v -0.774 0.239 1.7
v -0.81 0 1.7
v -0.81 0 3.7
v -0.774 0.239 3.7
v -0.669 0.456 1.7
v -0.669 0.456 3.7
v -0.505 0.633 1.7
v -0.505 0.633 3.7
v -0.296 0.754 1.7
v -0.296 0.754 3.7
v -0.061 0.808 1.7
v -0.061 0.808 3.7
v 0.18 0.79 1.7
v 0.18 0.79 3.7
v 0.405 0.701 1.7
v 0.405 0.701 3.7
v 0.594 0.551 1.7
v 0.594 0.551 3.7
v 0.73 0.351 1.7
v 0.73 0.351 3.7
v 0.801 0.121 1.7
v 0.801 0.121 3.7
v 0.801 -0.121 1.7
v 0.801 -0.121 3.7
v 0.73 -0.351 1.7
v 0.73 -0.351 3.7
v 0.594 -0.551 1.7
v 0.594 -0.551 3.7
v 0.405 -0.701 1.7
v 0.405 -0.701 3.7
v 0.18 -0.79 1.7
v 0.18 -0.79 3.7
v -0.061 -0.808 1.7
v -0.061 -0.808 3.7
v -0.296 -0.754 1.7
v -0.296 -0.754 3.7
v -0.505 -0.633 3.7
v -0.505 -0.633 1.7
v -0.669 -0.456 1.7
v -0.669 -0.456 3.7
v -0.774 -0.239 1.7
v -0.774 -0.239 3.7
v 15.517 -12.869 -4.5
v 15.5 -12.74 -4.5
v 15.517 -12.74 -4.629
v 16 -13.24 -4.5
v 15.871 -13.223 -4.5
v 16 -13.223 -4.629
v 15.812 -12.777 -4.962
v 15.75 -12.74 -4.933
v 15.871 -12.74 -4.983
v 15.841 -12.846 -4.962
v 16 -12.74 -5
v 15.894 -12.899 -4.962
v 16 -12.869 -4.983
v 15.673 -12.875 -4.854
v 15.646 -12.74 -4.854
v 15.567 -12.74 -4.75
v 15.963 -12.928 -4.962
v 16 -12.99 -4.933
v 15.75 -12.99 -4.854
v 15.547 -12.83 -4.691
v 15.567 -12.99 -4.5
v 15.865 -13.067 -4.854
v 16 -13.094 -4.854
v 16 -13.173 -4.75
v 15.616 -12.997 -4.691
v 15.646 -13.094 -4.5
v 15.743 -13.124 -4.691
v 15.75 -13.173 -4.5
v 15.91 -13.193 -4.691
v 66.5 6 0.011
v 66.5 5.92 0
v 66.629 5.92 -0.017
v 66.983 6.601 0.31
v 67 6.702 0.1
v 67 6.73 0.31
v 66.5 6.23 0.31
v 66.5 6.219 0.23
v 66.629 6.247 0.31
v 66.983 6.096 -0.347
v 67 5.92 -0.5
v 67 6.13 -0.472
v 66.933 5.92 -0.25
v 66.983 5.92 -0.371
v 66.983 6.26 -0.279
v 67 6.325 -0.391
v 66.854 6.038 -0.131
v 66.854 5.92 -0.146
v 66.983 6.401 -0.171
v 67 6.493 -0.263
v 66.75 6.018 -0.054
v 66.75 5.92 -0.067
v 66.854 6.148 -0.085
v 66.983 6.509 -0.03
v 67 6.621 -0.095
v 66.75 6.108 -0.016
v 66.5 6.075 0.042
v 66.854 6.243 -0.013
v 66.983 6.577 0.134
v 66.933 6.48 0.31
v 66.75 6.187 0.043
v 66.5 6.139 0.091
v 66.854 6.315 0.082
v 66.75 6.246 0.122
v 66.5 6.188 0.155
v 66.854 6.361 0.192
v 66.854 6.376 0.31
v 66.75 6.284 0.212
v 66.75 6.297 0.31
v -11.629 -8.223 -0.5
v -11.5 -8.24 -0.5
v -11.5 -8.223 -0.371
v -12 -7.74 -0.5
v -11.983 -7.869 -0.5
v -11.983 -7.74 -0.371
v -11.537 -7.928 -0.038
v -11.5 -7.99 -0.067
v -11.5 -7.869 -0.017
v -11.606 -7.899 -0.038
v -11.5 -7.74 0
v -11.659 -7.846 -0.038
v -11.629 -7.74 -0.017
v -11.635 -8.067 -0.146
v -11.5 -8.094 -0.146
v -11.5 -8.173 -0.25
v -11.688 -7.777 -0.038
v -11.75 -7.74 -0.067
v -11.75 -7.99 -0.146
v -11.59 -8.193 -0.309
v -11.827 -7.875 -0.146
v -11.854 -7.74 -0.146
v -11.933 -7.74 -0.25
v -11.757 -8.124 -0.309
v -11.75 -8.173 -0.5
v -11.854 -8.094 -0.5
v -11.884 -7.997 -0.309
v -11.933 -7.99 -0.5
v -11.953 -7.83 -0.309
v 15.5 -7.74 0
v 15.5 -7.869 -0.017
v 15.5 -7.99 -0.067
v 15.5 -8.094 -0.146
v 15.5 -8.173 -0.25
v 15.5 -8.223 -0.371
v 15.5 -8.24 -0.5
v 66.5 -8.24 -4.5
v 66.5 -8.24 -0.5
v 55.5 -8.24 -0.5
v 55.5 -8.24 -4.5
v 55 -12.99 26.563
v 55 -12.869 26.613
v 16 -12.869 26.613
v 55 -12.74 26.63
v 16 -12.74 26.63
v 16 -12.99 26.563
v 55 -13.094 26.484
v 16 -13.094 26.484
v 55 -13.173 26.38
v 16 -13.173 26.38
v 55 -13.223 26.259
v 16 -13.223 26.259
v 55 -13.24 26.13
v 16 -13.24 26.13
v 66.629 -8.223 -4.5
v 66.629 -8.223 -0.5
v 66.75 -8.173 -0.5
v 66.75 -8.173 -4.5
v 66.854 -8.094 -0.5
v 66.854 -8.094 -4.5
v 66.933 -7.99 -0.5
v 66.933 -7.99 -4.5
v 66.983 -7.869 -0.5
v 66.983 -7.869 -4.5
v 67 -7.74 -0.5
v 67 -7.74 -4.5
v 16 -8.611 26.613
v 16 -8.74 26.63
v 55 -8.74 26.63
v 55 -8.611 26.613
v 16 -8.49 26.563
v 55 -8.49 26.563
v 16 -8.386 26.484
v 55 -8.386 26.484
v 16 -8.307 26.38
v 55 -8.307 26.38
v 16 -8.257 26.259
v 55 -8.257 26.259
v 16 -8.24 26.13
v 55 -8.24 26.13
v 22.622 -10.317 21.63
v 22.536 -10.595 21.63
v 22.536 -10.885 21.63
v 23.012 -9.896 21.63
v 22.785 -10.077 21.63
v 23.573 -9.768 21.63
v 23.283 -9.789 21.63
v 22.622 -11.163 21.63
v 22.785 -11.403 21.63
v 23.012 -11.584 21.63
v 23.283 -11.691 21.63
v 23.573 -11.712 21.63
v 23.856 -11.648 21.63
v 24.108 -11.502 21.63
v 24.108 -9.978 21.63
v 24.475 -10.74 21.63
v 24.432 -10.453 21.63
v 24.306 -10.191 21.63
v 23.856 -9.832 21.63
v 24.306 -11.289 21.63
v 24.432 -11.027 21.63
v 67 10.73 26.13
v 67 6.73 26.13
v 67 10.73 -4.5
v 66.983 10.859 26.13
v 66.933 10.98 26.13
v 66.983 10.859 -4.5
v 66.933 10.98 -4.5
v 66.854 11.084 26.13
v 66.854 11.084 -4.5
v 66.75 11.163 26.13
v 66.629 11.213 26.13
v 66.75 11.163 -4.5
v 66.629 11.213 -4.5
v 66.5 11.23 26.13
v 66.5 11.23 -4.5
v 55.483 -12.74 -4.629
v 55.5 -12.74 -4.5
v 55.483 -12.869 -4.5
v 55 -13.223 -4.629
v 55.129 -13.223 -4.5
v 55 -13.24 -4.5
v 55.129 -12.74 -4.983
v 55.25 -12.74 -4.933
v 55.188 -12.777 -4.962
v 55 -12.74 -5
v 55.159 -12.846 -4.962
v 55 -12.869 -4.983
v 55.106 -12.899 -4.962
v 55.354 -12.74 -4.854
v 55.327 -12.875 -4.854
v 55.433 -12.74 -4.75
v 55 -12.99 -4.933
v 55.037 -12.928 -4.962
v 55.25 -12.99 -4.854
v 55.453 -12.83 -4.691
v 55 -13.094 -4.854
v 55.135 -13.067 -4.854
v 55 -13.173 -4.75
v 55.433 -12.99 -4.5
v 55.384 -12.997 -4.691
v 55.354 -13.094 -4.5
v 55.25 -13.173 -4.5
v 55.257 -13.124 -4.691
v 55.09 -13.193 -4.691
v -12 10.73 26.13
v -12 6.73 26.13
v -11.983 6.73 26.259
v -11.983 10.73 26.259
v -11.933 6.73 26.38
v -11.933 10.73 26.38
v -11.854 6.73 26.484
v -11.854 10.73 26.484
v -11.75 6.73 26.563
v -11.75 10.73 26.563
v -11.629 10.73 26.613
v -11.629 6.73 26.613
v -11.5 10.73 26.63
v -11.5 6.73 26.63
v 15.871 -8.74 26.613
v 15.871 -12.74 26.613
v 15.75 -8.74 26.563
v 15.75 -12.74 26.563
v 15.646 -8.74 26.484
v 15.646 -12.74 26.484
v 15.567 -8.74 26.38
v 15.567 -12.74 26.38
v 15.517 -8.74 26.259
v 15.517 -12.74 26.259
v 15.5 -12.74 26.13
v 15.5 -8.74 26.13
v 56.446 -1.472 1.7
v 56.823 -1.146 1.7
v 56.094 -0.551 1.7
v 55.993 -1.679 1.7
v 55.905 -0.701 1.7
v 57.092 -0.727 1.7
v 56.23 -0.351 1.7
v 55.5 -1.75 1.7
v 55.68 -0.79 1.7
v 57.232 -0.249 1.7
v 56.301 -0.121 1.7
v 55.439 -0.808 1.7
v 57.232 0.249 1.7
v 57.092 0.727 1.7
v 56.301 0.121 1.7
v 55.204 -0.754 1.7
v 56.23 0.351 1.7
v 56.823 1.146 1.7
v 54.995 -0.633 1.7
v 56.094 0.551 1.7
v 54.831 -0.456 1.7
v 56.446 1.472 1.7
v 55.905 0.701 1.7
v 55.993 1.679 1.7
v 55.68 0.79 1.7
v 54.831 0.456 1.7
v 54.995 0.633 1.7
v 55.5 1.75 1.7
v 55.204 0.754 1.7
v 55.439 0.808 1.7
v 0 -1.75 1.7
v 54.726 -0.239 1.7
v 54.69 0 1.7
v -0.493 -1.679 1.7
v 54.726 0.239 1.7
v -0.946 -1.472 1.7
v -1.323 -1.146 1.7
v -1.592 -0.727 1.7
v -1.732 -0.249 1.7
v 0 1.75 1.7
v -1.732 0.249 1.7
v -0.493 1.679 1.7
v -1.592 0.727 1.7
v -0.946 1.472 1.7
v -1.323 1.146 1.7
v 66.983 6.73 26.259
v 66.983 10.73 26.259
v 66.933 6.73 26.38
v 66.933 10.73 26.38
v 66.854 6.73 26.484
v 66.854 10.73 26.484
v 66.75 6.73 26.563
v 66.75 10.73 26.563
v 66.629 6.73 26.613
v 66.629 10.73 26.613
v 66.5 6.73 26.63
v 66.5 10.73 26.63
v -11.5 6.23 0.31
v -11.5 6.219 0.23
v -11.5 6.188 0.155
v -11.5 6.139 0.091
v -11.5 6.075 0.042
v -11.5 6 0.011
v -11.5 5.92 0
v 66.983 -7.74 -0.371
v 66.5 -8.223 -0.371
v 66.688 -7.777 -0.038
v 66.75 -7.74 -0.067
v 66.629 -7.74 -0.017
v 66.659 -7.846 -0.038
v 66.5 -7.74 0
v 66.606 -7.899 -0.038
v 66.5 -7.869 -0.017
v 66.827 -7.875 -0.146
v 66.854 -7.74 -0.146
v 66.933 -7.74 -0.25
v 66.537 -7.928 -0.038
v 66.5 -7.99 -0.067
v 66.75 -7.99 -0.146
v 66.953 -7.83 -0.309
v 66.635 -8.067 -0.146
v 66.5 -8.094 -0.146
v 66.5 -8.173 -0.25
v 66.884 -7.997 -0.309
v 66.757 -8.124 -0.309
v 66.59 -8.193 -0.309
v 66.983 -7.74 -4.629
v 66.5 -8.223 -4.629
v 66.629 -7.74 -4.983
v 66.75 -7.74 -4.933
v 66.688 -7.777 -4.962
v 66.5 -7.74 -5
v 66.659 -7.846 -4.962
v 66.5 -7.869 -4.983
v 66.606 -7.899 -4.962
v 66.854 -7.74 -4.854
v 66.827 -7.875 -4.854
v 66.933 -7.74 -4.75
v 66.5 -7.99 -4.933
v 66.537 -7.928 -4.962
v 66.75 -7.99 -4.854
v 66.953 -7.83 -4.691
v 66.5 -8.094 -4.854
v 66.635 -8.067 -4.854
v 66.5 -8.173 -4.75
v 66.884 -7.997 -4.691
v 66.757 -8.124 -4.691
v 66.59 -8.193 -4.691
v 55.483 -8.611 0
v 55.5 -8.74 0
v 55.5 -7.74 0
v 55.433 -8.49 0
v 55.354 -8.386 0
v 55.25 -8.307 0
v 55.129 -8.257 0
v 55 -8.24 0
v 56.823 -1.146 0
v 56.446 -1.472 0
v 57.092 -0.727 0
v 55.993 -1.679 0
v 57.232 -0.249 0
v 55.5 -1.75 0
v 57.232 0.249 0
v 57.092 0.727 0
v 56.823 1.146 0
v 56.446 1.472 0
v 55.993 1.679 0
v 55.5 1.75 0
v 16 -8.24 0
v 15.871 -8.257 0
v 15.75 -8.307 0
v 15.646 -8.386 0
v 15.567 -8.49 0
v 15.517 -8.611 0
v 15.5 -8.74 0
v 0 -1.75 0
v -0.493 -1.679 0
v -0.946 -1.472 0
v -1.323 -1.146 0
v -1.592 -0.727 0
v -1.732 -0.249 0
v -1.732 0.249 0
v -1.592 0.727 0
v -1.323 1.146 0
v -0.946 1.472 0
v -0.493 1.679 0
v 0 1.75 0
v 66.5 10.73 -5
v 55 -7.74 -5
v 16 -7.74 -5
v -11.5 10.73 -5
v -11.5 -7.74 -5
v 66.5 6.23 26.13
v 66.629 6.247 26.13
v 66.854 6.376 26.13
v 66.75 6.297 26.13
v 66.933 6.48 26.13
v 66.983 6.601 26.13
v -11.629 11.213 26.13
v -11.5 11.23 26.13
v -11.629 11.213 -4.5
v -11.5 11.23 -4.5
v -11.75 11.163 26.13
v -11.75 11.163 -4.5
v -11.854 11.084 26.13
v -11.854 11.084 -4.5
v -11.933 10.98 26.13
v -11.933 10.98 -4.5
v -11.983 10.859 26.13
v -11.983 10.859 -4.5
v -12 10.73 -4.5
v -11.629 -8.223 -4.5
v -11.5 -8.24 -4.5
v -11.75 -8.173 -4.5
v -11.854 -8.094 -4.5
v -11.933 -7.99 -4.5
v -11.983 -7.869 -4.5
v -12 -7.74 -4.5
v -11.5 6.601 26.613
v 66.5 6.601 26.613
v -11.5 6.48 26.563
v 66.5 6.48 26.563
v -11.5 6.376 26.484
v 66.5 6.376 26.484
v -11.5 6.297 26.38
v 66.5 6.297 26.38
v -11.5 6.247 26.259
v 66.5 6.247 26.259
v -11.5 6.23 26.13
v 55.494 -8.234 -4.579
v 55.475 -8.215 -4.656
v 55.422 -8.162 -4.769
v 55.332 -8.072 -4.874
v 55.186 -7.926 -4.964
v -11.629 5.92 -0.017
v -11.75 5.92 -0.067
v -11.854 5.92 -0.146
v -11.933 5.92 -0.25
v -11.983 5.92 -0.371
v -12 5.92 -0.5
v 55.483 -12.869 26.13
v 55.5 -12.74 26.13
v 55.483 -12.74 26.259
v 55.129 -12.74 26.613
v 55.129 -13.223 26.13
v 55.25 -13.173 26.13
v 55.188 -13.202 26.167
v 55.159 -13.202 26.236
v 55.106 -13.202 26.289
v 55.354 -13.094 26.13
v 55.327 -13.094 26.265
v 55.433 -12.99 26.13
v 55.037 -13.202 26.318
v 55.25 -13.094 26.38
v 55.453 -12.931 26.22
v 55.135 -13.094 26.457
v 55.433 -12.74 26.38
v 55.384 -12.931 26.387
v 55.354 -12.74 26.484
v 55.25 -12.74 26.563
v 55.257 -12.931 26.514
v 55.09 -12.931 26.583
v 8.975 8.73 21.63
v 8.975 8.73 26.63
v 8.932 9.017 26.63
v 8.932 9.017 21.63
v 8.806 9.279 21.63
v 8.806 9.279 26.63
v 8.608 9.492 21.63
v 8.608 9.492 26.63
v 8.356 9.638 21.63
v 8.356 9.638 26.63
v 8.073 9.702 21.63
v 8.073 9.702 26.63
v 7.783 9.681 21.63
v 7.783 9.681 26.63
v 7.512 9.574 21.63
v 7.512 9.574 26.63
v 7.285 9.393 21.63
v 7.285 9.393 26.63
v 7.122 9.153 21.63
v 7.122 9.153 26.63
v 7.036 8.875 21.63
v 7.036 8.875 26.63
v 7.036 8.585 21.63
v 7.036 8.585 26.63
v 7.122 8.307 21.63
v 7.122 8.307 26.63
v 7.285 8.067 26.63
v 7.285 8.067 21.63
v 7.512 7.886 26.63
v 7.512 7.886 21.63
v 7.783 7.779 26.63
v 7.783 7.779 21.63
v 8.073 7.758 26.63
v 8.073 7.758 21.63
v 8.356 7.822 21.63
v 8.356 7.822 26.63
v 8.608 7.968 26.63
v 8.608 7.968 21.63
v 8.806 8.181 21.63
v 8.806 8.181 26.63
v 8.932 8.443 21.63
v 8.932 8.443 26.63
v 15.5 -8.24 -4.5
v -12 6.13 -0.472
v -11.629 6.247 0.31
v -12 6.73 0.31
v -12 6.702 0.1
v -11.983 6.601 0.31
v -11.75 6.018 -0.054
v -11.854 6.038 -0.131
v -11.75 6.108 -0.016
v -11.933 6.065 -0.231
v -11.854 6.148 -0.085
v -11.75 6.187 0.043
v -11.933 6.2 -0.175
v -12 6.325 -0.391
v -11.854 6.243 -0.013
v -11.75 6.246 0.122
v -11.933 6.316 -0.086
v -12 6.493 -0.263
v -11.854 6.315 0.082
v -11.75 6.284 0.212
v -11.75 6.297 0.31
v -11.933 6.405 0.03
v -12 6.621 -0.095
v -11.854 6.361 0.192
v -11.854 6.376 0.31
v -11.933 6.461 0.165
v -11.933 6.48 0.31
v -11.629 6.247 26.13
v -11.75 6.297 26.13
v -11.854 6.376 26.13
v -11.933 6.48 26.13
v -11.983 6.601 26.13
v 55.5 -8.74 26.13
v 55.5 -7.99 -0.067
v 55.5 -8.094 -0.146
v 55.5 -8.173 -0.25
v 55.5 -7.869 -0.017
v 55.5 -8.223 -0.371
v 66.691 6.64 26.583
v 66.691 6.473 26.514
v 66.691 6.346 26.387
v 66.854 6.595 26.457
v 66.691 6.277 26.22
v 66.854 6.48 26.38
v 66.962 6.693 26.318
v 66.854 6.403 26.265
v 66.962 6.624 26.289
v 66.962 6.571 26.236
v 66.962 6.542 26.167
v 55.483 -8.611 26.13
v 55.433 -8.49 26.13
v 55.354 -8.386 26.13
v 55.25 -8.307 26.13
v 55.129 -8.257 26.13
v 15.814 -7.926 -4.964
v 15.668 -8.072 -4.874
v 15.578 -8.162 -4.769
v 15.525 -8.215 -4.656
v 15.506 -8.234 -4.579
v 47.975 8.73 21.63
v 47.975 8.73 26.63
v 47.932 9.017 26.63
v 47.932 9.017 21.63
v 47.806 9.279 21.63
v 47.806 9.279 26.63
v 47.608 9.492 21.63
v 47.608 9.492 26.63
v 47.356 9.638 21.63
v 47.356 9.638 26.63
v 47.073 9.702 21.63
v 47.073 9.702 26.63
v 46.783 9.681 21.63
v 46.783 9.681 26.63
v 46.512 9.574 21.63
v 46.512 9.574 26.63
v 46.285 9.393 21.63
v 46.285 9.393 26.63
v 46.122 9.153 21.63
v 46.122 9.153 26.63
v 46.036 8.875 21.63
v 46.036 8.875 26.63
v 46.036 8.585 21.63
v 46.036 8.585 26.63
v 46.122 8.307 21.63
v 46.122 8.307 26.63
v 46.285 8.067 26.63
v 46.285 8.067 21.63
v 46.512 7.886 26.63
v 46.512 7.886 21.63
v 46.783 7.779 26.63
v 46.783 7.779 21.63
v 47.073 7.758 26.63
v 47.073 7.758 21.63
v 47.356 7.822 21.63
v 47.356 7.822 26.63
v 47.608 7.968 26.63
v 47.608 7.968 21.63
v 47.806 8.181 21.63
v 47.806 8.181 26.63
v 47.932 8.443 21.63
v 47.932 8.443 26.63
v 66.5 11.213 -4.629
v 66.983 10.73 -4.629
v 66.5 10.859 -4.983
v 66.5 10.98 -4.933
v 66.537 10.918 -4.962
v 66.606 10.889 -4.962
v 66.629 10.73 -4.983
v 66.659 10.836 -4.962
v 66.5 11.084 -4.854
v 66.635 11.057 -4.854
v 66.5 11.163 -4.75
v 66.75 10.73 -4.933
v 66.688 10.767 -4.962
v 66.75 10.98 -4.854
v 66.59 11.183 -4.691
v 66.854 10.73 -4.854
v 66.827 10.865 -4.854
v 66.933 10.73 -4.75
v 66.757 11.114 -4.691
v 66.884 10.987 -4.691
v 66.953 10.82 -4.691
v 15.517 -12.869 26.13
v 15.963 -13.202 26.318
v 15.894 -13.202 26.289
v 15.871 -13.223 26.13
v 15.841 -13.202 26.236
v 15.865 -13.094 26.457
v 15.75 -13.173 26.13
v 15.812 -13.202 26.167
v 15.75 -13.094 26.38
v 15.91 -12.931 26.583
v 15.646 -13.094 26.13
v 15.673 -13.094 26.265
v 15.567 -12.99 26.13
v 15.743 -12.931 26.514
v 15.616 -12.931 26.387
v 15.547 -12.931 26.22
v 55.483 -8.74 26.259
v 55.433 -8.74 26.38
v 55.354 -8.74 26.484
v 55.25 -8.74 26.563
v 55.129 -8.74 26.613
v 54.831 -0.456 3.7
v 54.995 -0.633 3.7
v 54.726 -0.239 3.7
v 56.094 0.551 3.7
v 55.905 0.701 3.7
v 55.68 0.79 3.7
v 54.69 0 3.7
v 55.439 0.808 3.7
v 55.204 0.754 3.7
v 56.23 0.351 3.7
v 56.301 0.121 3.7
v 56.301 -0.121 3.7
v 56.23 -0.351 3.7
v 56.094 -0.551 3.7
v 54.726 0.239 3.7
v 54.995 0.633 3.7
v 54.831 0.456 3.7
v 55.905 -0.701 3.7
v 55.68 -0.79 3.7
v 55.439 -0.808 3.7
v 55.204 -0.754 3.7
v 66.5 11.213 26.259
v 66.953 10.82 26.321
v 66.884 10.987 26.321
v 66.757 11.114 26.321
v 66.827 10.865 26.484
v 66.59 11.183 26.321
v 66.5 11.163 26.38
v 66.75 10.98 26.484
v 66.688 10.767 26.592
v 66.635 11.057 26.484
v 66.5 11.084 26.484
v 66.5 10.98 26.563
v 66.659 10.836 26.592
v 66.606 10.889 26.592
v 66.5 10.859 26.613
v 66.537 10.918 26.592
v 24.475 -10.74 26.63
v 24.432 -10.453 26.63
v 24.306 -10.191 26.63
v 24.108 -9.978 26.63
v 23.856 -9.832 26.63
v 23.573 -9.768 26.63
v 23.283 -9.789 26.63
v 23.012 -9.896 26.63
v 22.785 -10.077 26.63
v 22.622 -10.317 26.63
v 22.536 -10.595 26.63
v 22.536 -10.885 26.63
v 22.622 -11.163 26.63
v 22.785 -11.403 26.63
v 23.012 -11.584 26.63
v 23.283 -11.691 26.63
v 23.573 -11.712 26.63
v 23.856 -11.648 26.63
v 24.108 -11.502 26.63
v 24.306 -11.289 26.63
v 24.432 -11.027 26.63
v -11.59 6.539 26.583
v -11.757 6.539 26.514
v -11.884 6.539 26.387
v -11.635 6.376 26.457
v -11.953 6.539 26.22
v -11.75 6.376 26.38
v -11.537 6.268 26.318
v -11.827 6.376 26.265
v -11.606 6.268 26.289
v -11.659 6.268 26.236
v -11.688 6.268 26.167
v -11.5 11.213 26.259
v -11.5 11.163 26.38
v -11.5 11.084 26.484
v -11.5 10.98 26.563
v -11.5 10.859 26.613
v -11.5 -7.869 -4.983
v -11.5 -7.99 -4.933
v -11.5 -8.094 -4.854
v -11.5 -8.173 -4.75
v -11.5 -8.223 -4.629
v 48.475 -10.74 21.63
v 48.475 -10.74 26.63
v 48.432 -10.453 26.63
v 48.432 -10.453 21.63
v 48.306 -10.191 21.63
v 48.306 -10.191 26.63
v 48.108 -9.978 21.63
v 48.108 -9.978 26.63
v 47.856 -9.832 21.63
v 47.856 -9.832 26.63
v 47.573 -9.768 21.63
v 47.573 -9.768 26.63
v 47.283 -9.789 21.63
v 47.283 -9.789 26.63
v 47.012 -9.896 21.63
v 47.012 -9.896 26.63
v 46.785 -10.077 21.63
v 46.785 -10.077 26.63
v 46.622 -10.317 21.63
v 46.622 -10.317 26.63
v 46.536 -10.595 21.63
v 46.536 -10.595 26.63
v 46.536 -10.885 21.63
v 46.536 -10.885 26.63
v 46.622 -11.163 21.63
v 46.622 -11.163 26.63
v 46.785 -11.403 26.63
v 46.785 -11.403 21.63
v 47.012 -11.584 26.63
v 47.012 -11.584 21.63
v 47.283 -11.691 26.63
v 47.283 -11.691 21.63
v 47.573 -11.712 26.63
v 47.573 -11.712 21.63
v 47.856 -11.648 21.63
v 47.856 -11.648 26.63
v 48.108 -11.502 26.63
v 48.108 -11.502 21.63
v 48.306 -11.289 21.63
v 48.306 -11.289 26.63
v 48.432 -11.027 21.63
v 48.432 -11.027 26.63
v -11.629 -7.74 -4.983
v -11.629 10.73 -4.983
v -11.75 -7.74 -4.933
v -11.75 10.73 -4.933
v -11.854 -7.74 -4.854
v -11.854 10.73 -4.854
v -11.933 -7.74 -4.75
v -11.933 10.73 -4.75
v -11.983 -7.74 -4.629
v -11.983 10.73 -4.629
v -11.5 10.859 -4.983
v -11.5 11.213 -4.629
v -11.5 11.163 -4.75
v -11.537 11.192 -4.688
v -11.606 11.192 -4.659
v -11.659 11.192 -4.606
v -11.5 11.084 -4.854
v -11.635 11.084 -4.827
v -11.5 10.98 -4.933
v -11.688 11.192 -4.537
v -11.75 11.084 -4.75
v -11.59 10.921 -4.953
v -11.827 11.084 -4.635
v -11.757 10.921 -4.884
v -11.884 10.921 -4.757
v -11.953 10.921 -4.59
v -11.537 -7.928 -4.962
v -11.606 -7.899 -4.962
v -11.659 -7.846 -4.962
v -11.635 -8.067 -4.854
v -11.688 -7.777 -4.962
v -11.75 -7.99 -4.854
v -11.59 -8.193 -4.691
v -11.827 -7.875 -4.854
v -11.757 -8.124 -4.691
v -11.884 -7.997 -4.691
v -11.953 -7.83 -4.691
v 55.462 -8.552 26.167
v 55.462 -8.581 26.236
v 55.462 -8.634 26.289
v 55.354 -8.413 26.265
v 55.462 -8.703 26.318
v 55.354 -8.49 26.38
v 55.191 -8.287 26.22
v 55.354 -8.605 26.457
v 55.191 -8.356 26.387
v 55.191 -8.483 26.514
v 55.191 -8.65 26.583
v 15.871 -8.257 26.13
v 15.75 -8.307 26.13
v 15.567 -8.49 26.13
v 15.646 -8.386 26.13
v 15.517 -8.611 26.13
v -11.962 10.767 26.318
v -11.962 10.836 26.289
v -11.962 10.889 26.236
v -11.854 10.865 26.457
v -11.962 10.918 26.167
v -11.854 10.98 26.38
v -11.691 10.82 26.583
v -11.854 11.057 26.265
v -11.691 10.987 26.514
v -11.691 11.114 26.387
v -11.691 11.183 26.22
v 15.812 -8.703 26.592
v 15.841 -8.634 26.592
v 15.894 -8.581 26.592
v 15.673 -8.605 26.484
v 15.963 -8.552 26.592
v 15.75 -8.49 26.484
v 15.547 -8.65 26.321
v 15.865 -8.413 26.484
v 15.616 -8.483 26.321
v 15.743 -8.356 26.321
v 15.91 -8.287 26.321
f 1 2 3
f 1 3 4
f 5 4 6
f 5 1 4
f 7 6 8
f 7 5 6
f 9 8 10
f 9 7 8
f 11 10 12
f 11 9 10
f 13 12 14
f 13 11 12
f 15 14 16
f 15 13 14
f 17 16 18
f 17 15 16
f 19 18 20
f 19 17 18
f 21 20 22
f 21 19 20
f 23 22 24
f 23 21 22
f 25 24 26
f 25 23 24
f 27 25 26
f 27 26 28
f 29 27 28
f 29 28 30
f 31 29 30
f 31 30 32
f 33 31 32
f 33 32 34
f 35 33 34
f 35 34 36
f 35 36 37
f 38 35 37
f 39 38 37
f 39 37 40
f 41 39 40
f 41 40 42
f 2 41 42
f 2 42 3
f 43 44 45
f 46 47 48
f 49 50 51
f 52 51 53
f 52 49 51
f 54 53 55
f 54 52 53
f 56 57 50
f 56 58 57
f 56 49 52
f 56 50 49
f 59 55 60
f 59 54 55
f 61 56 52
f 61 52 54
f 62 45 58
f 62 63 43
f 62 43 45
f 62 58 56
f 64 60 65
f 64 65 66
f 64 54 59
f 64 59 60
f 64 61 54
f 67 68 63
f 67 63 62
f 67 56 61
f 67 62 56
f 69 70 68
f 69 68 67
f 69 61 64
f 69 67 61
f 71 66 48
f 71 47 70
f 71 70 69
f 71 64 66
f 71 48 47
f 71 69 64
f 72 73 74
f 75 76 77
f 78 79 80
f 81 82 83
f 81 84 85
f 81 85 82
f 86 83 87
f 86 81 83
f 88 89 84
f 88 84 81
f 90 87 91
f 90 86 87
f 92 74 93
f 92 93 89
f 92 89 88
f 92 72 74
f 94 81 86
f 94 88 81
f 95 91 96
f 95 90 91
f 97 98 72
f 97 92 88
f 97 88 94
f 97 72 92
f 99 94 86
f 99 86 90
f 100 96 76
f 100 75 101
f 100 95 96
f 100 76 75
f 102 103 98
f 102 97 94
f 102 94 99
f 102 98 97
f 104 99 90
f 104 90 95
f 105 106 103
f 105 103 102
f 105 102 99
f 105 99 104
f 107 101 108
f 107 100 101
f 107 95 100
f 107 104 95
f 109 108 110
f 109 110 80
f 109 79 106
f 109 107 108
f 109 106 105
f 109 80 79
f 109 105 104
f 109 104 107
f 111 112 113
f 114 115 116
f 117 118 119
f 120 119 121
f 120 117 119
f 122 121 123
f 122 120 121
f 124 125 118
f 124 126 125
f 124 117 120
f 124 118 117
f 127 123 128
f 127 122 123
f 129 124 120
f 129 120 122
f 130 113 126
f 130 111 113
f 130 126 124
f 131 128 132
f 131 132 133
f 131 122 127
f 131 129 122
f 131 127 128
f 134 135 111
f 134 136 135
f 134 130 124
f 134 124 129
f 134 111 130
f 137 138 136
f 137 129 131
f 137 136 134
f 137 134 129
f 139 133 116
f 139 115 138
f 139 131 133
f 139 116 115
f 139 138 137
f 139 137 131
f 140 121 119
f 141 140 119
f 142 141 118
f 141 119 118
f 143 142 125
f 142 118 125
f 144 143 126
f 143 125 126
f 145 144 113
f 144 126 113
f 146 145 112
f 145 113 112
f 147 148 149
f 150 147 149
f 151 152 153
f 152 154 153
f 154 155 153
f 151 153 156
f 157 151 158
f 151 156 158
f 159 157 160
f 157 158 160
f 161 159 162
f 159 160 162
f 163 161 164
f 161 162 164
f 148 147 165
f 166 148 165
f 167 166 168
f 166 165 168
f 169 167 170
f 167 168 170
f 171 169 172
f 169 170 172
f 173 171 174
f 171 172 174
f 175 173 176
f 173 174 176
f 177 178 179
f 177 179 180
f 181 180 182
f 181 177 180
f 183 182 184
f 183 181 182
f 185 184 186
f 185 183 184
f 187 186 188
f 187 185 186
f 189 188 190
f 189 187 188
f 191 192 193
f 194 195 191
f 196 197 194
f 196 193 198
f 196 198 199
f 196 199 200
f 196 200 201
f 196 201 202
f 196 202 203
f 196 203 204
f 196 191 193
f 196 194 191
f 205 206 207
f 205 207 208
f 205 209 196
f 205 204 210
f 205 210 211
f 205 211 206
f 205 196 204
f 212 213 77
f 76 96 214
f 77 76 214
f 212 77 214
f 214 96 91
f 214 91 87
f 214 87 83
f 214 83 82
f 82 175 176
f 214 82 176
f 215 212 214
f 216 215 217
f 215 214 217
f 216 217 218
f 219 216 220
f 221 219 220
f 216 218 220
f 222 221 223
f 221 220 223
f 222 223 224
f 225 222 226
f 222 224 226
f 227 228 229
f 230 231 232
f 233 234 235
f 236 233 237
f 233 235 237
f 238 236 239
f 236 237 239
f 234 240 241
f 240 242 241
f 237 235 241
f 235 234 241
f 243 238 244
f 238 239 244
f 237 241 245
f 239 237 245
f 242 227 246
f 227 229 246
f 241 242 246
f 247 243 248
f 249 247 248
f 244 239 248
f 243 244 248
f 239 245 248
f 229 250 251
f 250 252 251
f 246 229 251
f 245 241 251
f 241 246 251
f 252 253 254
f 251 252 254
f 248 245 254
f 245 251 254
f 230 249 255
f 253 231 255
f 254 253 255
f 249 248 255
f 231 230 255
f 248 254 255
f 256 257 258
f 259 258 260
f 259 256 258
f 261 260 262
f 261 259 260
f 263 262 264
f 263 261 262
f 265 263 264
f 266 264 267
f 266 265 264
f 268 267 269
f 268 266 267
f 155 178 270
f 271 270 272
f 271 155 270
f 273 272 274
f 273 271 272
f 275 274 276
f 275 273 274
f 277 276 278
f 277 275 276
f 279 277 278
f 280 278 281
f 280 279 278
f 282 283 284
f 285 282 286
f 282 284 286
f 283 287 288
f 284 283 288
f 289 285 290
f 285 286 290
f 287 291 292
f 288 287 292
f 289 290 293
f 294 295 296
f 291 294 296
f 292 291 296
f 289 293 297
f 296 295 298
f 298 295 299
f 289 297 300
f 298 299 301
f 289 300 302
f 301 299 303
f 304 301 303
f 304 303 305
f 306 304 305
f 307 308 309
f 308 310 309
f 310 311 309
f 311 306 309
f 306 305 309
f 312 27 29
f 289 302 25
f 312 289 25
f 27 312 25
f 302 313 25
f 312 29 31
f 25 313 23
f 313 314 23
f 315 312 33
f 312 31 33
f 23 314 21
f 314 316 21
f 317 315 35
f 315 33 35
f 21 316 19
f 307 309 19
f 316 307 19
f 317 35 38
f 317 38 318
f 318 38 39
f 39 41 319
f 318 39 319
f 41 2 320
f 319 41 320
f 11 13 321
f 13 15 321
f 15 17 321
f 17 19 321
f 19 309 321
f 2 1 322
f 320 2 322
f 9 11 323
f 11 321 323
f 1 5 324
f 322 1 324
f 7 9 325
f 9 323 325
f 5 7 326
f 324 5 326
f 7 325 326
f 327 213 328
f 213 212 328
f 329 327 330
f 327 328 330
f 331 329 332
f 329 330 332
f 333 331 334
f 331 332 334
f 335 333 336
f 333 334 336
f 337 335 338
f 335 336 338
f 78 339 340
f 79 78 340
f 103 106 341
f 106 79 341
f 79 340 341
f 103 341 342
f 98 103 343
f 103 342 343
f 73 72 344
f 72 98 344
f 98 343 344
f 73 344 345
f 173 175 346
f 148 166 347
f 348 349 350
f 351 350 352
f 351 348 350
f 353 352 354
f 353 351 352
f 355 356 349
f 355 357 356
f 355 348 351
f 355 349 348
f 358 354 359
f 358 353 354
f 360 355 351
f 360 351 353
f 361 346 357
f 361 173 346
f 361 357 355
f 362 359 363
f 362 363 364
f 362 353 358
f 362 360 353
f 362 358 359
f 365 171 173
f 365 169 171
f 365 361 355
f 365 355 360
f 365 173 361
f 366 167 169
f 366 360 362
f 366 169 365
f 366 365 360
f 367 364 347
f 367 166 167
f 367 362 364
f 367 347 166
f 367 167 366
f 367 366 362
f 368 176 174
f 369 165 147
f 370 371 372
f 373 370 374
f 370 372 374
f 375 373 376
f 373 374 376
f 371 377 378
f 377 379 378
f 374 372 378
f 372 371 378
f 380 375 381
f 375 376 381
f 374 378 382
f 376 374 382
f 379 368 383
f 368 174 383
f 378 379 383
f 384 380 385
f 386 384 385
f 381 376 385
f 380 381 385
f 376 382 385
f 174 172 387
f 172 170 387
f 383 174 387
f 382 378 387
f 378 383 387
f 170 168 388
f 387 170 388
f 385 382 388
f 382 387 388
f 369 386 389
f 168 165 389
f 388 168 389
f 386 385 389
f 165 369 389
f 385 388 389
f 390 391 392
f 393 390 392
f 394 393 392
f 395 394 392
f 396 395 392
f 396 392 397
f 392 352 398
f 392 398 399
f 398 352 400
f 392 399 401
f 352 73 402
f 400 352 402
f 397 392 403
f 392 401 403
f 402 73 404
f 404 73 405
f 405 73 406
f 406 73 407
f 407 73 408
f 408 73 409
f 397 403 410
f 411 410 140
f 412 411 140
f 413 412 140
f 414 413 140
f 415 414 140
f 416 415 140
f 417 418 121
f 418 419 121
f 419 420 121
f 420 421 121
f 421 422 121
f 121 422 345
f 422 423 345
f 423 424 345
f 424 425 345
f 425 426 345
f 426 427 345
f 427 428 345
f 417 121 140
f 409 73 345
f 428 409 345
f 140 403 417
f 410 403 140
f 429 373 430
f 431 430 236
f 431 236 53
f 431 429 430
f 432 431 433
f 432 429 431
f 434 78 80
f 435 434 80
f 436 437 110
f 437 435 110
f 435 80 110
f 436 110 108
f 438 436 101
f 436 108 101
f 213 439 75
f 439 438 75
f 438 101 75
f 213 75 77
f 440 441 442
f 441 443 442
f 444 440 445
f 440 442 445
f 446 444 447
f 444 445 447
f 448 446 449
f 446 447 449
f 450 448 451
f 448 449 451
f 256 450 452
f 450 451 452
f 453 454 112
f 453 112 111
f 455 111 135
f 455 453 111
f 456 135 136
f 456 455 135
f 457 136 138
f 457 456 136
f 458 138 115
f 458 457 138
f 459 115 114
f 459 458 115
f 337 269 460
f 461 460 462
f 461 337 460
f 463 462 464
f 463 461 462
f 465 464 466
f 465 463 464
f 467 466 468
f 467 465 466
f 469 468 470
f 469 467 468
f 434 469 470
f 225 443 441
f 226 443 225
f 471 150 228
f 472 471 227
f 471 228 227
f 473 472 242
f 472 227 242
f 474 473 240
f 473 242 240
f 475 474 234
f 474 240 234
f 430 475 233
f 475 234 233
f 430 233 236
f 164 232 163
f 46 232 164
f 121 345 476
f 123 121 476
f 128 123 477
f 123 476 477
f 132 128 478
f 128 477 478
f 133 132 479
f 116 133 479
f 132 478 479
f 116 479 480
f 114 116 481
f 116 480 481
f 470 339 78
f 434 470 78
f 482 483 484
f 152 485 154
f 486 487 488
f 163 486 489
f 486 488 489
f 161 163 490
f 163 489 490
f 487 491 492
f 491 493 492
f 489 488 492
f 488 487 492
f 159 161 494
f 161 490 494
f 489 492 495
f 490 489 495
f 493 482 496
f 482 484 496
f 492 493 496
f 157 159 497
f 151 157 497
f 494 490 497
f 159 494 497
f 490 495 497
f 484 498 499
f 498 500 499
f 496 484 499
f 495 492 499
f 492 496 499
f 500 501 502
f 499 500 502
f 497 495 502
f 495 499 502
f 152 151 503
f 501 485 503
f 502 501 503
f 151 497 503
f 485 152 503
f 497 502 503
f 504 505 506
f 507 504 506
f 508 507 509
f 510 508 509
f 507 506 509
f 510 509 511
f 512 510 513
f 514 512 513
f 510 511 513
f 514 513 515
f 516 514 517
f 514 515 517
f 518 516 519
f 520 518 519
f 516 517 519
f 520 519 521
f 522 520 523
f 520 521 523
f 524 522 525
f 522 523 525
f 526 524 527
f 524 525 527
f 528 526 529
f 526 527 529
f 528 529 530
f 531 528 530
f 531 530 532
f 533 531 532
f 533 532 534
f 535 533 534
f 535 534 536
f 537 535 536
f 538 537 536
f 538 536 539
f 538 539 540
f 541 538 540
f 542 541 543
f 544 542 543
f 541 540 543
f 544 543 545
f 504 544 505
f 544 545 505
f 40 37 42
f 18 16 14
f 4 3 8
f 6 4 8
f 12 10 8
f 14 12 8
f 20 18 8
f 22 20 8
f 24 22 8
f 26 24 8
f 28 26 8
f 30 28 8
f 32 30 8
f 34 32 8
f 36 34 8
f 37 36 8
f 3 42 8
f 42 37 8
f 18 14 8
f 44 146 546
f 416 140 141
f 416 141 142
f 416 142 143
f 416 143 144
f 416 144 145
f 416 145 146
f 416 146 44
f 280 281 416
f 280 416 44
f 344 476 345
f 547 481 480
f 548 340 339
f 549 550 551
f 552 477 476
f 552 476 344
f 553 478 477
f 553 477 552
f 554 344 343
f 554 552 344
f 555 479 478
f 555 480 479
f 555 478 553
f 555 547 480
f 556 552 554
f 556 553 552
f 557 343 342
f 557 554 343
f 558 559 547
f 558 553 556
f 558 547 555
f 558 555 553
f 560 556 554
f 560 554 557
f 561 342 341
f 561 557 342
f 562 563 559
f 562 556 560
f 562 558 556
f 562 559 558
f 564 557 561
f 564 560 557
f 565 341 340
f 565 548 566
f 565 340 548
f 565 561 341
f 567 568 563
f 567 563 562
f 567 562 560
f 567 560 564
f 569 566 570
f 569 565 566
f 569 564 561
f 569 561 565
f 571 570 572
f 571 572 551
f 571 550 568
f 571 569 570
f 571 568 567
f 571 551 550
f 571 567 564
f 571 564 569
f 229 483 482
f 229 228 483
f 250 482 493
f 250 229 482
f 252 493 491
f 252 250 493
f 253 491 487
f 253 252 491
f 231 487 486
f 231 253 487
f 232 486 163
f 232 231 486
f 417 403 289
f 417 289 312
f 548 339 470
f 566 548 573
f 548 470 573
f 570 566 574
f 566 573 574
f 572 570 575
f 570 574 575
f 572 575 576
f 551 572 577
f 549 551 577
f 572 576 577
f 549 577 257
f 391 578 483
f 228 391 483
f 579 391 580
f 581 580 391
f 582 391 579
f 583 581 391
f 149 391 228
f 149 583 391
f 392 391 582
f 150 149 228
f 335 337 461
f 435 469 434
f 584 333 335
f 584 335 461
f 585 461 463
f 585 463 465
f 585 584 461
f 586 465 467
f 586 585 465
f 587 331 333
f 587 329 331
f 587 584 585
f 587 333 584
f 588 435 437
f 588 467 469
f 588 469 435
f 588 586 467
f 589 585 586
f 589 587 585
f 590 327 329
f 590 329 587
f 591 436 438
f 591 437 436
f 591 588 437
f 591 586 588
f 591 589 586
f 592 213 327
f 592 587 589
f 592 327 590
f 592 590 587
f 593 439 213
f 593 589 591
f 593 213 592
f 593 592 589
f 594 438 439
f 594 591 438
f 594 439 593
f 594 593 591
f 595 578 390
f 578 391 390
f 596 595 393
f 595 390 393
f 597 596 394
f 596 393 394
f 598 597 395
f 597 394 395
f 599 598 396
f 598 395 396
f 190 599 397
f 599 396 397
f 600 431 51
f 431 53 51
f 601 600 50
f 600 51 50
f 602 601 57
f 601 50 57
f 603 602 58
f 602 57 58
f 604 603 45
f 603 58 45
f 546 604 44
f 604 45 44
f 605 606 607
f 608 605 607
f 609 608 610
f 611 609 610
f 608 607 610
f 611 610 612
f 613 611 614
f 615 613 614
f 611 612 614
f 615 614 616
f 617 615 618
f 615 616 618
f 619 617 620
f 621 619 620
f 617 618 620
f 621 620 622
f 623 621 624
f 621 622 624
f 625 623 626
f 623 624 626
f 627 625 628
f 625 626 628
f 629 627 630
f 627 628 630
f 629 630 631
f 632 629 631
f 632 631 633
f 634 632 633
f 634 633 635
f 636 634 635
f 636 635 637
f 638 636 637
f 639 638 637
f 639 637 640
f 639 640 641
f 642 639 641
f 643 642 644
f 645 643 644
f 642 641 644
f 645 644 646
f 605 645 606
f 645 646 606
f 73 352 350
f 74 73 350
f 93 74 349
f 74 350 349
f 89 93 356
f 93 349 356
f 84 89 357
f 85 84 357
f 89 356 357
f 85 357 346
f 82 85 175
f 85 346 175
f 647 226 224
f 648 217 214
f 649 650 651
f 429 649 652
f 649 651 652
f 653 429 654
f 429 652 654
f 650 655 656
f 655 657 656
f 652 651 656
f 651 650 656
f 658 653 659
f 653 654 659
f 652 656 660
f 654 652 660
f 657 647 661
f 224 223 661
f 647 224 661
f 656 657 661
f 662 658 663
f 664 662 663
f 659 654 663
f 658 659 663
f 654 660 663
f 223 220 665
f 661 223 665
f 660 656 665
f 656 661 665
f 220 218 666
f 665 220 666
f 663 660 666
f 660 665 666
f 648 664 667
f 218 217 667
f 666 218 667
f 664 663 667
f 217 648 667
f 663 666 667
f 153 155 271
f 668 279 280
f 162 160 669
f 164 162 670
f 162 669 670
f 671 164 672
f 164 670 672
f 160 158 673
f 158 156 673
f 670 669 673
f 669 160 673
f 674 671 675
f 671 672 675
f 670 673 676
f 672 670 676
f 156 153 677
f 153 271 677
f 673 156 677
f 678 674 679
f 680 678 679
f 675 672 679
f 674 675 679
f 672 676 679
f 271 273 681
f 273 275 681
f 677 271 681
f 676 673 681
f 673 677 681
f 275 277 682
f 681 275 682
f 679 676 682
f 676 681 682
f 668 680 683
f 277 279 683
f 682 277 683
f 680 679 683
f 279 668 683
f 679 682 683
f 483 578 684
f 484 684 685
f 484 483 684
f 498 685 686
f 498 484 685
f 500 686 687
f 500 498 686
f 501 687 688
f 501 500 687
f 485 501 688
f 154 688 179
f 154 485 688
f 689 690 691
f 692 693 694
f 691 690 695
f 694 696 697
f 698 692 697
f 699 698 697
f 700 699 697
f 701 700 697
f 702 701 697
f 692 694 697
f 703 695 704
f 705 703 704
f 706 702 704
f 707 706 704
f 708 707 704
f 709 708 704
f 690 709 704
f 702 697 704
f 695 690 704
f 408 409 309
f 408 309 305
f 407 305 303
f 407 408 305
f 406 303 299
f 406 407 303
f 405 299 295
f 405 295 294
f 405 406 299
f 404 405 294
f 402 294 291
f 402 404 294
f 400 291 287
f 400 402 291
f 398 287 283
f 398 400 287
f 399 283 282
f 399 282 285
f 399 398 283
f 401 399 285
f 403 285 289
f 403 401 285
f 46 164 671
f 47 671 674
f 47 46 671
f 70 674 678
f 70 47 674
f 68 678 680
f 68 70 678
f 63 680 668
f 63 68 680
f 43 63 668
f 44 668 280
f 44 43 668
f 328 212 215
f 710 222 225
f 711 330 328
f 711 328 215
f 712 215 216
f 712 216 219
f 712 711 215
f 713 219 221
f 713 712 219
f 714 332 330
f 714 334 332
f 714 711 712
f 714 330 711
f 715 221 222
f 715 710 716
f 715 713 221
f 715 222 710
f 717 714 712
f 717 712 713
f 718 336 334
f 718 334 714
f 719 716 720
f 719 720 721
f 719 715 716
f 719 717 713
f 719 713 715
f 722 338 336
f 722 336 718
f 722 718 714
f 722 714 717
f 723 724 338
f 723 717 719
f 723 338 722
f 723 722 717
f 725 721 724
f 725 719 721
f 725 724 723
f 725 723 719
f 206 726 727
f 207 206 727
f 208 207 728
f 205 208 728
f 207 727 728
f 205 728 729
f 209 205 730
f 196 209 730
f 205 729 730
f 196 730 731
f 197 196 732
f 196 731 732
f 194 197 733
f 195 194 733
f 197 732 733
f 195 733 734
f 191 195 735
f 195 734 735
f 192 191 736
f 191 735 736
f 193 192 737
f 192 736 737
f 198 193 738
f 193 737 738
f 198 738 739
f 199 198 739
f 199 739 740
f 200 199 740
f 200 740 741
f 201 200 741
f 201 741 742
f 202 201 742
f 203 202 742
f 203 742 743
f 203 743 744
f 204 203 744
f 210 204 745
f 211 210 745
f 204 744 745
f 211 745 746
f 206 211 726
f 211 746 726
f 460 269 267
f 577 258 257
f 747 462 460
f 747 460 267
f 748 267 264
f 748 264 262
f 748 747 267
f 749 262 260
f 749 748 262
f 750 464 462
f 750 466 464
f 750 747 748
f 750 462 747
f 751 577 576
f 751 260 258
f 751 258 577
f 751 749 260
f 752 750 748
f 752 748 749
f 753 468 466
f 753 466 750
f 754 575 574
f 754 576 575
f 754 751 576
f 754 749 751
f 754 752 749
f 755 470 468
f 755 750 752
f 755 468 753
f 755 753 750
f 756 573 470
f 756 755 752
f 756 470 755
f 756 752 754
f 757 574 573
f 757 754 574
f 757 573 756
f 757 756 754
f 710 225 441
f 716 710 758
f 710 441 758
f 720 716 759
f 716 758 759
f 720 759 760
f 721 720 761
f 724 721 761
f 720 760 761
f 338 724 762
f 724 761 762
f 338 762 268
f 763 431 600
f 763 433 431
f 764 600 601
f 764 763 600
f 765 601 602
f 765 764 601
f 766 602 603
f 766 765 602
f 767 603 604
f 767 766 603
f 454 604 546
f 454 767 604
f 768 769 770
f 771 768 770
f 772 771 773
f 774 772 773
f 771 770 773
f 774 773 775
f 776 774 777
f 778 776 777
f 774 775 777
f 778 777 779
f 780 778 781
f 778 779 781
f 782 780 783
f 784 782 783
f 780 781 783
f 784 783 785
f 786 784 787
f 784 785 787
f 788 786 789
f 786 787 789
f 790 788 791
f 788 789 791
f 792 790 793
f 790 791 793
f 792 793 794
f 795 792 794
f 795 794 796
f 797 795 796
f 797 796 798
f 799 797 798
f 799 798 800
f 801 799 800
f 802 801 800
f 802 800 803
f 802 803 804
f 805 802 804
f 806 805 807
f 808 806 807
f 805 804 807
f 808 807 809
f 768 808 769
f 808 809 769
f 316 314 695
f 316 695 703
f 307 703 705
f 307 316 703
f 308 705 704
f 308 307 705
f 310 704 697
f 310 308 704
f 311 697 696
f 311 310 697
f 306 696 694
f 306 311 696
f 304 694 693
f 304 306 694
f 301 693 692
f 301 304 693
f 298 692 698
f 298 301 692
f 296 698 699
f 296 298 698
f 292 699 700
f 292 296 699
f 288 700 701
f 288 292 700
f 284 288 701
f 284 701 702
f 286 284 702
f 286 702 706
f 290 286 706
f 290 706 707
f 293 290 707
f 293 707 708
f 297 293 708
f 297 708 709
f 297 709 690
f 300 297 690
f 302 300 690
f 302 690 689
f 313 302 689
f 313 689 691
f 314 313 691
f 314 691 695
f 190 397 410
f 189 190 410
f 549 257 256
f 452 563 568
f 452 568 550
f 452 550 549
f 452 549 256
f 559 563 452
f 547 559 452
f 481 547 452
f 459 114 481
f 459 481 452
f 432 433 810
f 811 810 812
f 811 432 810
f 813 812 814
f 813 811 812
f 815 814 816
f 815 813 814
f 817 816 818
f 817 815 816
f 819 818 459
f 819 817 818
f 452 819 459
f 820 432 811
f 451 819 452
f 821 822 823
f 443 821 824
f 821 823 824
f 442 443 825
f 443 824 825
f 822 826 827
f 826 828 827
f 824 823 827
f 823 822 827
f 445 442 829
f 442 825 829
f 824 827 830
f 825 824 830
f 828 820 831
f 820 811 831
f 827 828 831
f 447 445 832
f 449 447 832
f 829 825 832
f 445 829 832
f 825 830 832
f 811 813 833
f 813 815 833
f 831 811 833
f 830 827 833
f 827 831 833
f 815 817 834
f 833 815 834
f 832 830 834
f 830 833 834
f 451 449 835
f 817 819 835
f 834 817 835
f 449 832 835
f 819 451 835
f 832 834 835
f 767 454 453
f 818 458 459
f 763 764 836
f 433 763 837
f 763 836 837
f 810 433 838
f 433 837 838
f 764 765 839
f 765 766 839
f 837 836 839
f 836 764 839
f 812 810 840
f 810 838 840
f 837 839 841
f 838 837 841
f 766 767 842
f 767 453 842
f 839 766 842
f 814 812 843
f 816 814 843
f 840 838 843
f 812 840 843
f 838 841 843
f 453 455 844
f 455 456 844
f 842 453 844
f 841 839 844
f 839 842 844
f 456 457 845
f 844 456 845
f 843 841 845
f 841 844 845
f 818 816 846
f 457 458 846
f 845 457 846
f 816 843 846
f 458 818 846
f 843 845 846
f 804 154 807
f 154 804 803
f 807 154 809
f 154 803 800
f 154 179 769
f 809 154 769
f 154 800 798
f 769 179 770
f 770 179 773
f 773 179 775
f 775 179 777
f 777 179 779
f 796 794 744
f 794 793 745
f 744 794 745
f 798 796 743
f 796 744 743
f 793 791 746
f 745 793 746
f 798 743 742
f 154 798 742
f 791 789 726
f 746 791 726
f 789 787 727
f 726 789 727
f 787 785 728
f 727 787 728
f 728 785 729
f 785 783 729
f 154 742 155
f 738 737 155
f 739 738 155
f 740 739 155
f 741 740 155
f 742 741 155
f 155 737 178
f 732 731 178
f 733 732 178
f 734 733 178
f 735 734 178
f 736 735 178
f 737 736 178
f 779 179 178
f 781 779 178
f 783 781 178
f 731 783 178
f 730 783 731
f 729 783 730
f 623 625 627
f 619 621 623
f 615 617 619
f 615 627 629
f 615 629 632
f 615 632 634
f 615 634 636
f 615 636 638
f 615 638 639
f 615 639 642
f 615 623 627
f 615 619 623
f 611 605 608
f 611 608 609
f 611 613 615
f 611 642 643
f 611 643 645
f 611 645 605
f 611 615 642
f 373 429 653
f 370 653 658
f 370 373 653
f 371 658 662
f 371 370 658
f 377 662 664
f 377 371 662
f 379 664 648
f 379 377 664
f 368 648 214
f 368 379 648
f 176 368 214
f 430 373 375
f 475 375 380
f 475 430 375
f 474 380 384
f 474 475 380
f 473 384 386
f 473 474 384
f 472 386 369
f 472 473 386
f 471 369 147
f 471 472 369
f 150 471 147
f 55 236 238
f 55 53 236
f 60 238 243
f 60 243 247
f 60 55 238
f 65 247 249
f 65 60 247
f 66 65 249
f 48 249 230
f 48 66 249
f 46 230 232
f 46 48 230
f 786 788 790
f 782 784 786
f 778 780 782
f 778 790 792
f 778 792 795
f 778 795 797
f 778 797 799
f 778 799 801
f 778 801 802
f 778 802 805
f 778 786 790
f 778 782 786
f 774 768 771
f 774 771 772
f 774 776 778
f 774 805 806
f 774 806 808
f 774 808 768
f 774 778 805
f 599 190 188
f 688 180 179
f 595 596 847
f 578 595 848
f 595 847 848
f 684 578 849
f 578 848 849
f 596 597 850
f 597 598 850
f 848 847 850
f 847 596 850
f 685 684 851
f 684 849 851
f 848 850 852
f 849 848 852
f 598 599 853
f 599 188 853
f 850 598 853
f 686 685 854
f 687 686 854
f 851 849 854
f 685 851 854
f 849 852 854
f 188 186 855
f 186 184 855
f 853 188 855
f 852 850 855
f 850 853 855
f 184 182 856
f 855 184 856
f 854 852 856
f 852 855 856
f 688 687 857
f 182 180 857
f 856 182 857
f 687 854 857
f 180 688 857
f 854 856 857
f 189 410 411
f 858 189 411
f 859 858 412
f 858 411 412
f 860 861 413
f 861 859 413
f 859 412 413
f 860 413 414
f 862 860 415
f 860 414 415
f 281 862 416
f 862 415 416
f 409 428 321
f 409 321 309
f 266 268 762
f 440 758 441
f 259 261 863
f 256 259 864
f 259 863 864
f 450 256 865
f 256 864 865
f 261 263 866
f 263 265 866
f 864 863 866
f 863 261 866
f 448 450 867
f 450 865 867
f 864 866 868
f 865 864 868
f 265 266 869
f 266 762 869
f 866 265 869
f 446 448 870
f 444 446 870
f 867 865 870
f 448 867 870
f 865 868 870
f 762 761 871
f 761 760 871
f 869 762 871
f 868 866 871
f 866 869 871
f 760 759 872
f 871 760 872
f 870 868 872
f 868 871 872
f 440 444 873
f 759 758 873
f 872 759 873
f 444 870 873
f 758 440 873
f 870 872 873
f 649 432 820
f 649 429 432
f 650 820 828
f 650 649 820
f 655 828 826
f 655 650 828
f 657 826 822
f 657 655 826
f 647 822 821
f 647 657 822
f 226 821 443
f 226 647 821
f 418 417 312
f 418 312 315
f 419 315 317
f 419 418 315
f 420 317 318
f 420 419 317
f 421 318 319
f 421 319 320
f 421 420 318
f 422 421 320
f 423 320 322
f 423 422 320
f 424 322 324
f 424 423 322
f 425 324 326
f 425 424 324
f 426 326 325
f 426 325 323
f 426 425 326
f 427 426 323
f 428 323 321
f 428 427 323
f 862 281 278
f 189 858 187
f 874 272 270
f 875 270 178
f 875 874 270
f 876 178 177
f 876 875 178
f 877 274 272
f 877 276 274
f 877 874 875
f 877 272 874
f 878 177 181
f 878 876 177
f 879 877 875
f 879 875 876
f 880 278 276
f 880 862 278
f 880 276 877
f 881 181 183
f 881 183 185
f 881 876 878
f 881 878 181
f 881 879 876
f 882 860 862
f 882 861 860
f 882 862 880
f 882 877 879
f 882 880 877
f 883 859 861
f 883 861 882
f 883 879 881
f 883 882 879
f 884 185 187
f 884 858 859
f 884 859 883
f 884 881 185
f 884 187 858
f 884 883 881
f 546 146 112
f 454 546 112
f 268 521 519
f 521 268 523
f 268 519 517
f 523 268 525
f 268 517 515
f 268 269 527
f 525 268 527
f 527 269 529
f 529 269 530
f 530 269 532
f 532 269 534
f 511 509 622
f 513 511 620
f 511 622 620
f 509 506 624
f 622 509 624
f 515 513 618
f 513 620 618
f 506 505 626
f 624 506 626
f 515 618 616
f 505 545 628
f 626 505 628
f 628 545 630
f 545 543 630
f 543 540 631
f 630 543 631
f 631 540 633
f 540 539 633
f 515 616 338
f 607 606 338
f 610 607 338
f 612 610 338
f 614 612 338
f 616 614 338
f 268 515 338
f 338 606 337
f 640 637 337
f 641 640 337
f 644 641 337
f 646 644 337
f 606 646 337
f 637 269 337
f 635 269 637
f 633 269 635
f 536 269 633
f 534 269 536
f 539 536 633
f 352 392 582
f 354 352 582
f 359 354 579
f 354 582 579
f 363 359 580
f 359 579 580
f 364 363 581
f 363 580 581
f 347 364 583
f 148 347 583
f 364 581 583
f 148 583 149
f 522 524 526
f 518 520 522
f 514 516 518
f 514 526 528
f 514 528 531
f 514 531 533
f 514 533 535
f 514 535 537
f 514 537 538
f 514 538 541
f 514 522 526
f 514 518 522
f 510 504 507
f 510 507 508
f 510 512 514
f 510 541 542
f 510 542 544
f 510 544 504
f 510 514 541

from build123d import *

# Parameters (mm, degrees)
EXTRUDE_3_DEPTH     = 1.7
SKETCH_4_R          = 0.81
EXTRUDE_4_DEPTH     = 3.7
SKETCH_5_W          = 79
SKETCH_5_H          = 14.47
EXTRUDE_5_DEPTH     = 5
SKETCH_6_W          = 79
SKETCH_6_H          = 31.63
EXTRUDE_6_DEPTH     = 5
FILLET_1_R          = 0.31
FILLET_2_R          = 0.5
FILLET_3_R          = 0.5
FILLET_5_R          = 0.5
SKETCH_8_W          = 40
SKETCH_8_H          = 31.63
EXTRUDE_7_DEPTH     = 5
FILLET_6_R          = 0.5
SKETCH_9_R          = 0.975
CUT_EXTRUDE_1_DEPTH = 5
FILLET_7_R          = 0.5


with BuildPart() as part:
    # 草图1 → 凸台-拉伸3 (new body)
    with BuildSketch(Plane.XY):
        with BuildLine():
            Line((0, 1.75), (55.5, 1.75))
            ThreePointArc((55.5, 1.75), (57.25, 0), (55.5, -1.75))
            Line((55.5, -1.75), (0, -1.75))
            ThreePointArc((0, -1.75), (-1.75, 0), (0, 1.75))
        make_face()
    extrude(amount=EXTRUDE_3_DEPTH)

    # 草图4 → 凸台-拉伸4 (add)
    with BuildSketch(Plane(origin=(0, 0, 0), x_dir=(-1, 0, 0), z_dir=(0, 0, -1))):
        Circle(SKETCH_4_R)
        with Locations((-55.5, 0)):
            Circle(SKETCH_4_R)
    extrude(amount=-EXTRUDE_4_DEPTH)

    # 草图5 → 凸台-拉伸5 (add)
    with BuildSketch(Plane(origin=(0, 0, 0), x_dir=(-1, 0, 0), z_dir=(0, 0, -1))):
        with Locations((-27.5, -1.005)):
            Rectangle(SKETCH_5_W, SKETCH_5_H)
    extrude(amount=EXTRUDE_5_DEPTH)

    # 草图6 → 凸台-拉伸6 (add)
    with BuildSketch(Plane(origin=(0, 6.23, 0), x_dir=(1, 0, 0), z_dir=(0, 1, 0))):
        with Locations((27.5, -10.815)):
            Rectangle(SKETCH_6_W, SKETCH_6_H)
    extrude(amount=EXTRUDE_6_DEPTH)

    # 圆角1
    fillet_1_edges = [part.edges().sort_by_distance(p)[0] for p in [
        (27.5, 6.23, 0),
    ]]
    fillet(fillet_1_edges, radius=FILLET_1_R)

    # 圆角2
    fillet_2_edges = [part.edges().sort_by_distance(p)[0] for p in [
        (67, -8.24, -2.5),
    ]]
    fillet(fillet_2_edges, radius=FILLET_2_R)

    # 圆角3
    fillet_3_edges = [part.edges().sort_by_distance(p)[0] for p in [
        (-12, -8.24, -2.5),
    ]]
    fillet(fillet_3_edges, radius=FILLET_3_R)

    # 圆角5
    fillet_5_edges = [part.edges().sort_by_distance(p)[0] for p in [
        (67, 11.23, 10.815),
    ]]
    fillet(fillet_5_edges, radius=FILLET_5_R)

    # 草图8 → 凸台-拉伸7 (add)
    with BuildSketch(Plane(origin=(0, -8.24, 0), x_dir=(-1, 0, 0), z_dir=(0, -1, 0))):
        with Locations((-35.5, -10.815)):
            Rectangle(SKETCH_8_W, SKETCH_8_H)
    extrude(amount=EXTRUDE_7_DEPTH)

    # 圆角6
    fillet_6_edges = [part.edges().sort_by_distance(p)[0] for p in [
        (67, 8.48, 26.63),
        (66.853553391, 11.083553391, 26.63),
        (2, -8.24, -5),
        (-11.853553391, -8.093553391, -5),
        (27.25, 11.23, -5),
        (66.853553391, 11.083553391, -5),
        (61, -8.24, -5),
        (66.853553391, -8.093553391, -5),
        (27.5, 6.23, 26.63),
        (-12, 8.73, 26.63),
        (27.25, 11.23, 26.63),
        (-12, 11.23, 10.815),
        (15.5, -8.24, 13.315),
        (15.5, -10.74, 26.63),
        (35.5, -8.24, 26.63),
        (55.5, -8.24, 13.315),
        (55.5, -10.74, 26.63),
        (55.5, -13.24, 10.815),
        (35.5, -13.24, 26.63),
        (15.5, -13.24, 10.815),
        (15.5, -10.74, -5),
        (-12, 1.745, -5),
        (55.5, -10.74, -5),
        (35.5, -13.24, -5),
        (67, 1.495, -5),
    ]]
    fillet(fillet_6_edges, radius=FILLET_6_R)

    # 草图9 → 切除-拉伸1 (cut)
    with BuildSketch(Plane.XY.offset(26.63)):
        with Locations((23.5, -10.74)):
            Circle(SKETCH_9_R)
        with Locations((47.5, -10.74)):
            Circle(SKETCH_9_R)
        with Locations((8, 8.73)):
            Circle(SKETCH_9_R)
        with Locations((47, 8.73)):
            Circle(SKETCH_9_R)
    extrude(amount=-CUT_EXTRUDE_1_DEPTH, mode=Mode.SUBTRACT)

    # 圆角7
    # the kernel refuses this fillet: 0.5 mm, written as the material it takes off along each edge
    with BuildSketch(Plane(origin=(-11.5, 6.73, 26.13), x_dir=(-1, 0, 0), z_dir=(0, -1, 0))) as fillet_7_piece_1_section:
        Polygon((0, 0), (FILLET_7_R * 1.02, 0), (FILLET_7_R * 1.02, -FILLET_7_R * 1.02), (0, -FILLET_7_R * 1.02), align=None)
    fillet_7_piece_1 = extrude(amount=FILLET_7_R * 1.02, mode=Mode.PRIVATE)
    fillet_7_piece_1 = fillet_7_piece_1 - Plane(origin=(-11.5, 6.73, 26.13), x_dir=(0.7071067811865475, 0, -0.7071067811865475), z_dir=(0, -1, 0)) * Sphere(FILLET_7_R, mode=Mode.PRIVATE)
    add(fillet_7_piece_1, mode=Mode.SUBTRACT)
    with BuildSketch(Plane(origin=(66.5, 6.73, 26.13), x_dir=(0, -1, 0), z_dir=(1, 0, 0))) as fillet_7_piece_2_section:
        Polygon((0, 0), (FILLET_7_R * 1.02, 0), (FILLET_7_R * 1.02, -FILLET_7_R * 1.02), (0, -FILLET_7_R * 1.02), align=None)
    fillet_7_piece_2 = extrude(amount=FILLET_7_R * 1.02, mode=Mode.PRIVATE)
    fillet_7_piece_2 = fillet_7_piece_2 - Plane(origin=(66.5, 6.73, 26.13), x_dir=(0, 0.7071067811865475, -0.7071067811865475), z_dir=(1, 0, 0)) * Sphere(FILLET_7_R, mode=Mode.PRIVATE)
    add(fillet_7_piece_2, mode=Mode.SUBTRACT)
    with BuildSketch(Plane(origin=(-12, 5.92, 0), x_dir=(1, 0, 0), z_dir=(0, -1, 0))) as fillet_7_piece_3:
        with BuildLine():
            CenterArc((FILLET_7_R, -FILLET_7_R), FILLET_7_R, 90, 90)
            Line((0, -FILLET_7_R), (0, 0))
            Line((0, 0), (FILLET_7_R, 0))
        make_face()
    extrude(amount=13.66, mode=Mode.SUBTRACT)
    with BuildSketch(Plane(origin=(67, -7.74, 0), x_dir=(0, 0, -1), z_dir=(0, 1, 0))) as fillet_7_piece_4:
        with BuildLine():
            CenterArc((FILLET_7_R, FILLET_7_R), FILLET_7_R, 180, 90)
            Line((0, FILLET_7_R), (0, 0))
            Line((0, 0), (FILLET_7_R, 0))
        make_face()
    extrude(amount=13.66, mode=Mode.SUBTRACT)
    with BuildSketch(Plane(origin=(-12, 6.23, 26.13), x_dir=(1, 0, 0), z_dir=(0, 0, -1))) as fillet_7_piece_5:
        with BuildLine():
            CenterArc((FILLET_7_R, -FILLET_7_R), FILLET_7_R, 90, 90)
            Line((0, -FILLET_7_R), (0, 0))
            Line((0, 0), (FILLET_7_R, 0))
        make_face()
    extrude(amount=25.82, mode=Mode.SUBTRACT)
    with BuildSketch(Plane(origin=(-12, 5.92, 0.31), x_dir=(0, 0, -1), z_dir=(0, -1, 0))) as fillet_7_piece_6:
        with BuildLine():
            CenterArc((0.31 + FILLET_7_R, FILLET_7_R), FILLET_7_R, 180, 90)
            Line((0.31 + FILLET_7_R, 0), (0.31, 0))
            Line((0.31, 0), (0.31, FILLET_7_R))
        make_face()
    revolve(axis=Axis((-12, 5.92, 0.31), (1, 0, 0)), revolution_arc=90, mode=Mode.SUBTRACT)
    with BuildSketch(Plane(origin=(67, 5.92, 0.31), x_dir=(0, 0, -1), z_dir=(0, -1, 0))) as fillet_7_piece_7:
        with BuildLine():
            CenterArc((0.31 + FILLET_7_R, -FILLET_7_R), FILLET_7_R, 90, 90)
            Line((0.31, -FILLET_7_R), (0.31, 0))
            Line((0.31, 0), (0.31 + FILLET_7_R, 0))
        make_face()
    revolve(axis=Axis((67, 5.92, 0.31), (1, 0, 0)), revolution_arc=90, mode=Mode.SUBTRACT)
    with BuildSketch(Plane(origin=(55.5, -8.24, 0), x_dir=(0, 1, 0), z_dir=(1, 0, 0))) as fillet_7_piece_8:
        with BuildLine():
            CenterArc((FILLET_7_R, -FILLET_7_R), FILLET_7_R, 90, 90)
            Line((0, -FILLET_7_R), (0, 0))
            Line((0, 0), (FILLET_7_R, 0))
        make_face()
    extrude(amount=11, mode=Mode.SUBTRACT)
    with BuildSketch(Plane(origin=(66.5, -7.74, 0), x_dir=(1, 0, 0), z_dir=(0, 1, 0))) as fillet_7_piece_9:
        with BuildLine():
            CenterArc((0.5 - FILLET_7_R, FILLET_7_R), FILLET_7_R, 270, 90)
            Line((0.5 - FILLET_7_R, 0), (0.5, 0))
            Line((0.5, 0), (0.5, FILLET_7_R))
        make_face()
    revolve(axis=Axis((66.5, -7.74, 0), (0, 0, -1)), revolution_arc=90, mode=Mode.SUBTRACT)
    with BuildSketch(Plane(origin=(-11.5, -7.74, 0), x_dir=(0, -1, 0), z_dir=(1, 0, 0))) as fillet_7_piece_10:
        with BuildLine():
            CenterArc((0.5 - FILLET_7_R, FILLET_7_R), FILLET_7_R, 270, 90)
            Line((0.5, FILLET_7_R), (0.5, 0))
            Line((0.5, 0), (0.5 - FILLET_7_R, 0))
        make_face()
    revolve(axis=Axis((-11.5, -7.74, 0), (0, 0, -1)), revolution_arc=90, mode=Mode.SUBTRACT)
    with BuildSketch(Plane(origin=(-11.5, -8.24, 0), x_dir=(0, 1, 0), z_dir=(1, 0, 0))) as fillet_7_piece_11:
        with BuildLine():
            CenterArc((FILLET_7_R, -FILLET_7_R), FILLET_7_R, 90, 90)
            Line((0, -FILLET_7_R), (0, 0))
            Line((0, 0), (FILLET_7_R, 0))
        make_face()
    extrude(amount=27, mode=Mode.SUBTRACT)
    with BuildSketch(Plane(origin=(67, 6.23, 0.31), x_dir=(0, 1, 0), z_dir=(0, 0, 1))) as fillet_7_piece_12:
        with BuildLine():
            CenterArc((FILLET_7_R, FILLET_7_R), FILLET_7_R, 180, 90)
            Line((0, FILLET_7_R), (0, 0))
            Line((0, 0), (FILLET_7_R, 0))
        make_face()
    extrude(amount=25.82, mode=Mode.SUBTRACT)


solid = part.part
